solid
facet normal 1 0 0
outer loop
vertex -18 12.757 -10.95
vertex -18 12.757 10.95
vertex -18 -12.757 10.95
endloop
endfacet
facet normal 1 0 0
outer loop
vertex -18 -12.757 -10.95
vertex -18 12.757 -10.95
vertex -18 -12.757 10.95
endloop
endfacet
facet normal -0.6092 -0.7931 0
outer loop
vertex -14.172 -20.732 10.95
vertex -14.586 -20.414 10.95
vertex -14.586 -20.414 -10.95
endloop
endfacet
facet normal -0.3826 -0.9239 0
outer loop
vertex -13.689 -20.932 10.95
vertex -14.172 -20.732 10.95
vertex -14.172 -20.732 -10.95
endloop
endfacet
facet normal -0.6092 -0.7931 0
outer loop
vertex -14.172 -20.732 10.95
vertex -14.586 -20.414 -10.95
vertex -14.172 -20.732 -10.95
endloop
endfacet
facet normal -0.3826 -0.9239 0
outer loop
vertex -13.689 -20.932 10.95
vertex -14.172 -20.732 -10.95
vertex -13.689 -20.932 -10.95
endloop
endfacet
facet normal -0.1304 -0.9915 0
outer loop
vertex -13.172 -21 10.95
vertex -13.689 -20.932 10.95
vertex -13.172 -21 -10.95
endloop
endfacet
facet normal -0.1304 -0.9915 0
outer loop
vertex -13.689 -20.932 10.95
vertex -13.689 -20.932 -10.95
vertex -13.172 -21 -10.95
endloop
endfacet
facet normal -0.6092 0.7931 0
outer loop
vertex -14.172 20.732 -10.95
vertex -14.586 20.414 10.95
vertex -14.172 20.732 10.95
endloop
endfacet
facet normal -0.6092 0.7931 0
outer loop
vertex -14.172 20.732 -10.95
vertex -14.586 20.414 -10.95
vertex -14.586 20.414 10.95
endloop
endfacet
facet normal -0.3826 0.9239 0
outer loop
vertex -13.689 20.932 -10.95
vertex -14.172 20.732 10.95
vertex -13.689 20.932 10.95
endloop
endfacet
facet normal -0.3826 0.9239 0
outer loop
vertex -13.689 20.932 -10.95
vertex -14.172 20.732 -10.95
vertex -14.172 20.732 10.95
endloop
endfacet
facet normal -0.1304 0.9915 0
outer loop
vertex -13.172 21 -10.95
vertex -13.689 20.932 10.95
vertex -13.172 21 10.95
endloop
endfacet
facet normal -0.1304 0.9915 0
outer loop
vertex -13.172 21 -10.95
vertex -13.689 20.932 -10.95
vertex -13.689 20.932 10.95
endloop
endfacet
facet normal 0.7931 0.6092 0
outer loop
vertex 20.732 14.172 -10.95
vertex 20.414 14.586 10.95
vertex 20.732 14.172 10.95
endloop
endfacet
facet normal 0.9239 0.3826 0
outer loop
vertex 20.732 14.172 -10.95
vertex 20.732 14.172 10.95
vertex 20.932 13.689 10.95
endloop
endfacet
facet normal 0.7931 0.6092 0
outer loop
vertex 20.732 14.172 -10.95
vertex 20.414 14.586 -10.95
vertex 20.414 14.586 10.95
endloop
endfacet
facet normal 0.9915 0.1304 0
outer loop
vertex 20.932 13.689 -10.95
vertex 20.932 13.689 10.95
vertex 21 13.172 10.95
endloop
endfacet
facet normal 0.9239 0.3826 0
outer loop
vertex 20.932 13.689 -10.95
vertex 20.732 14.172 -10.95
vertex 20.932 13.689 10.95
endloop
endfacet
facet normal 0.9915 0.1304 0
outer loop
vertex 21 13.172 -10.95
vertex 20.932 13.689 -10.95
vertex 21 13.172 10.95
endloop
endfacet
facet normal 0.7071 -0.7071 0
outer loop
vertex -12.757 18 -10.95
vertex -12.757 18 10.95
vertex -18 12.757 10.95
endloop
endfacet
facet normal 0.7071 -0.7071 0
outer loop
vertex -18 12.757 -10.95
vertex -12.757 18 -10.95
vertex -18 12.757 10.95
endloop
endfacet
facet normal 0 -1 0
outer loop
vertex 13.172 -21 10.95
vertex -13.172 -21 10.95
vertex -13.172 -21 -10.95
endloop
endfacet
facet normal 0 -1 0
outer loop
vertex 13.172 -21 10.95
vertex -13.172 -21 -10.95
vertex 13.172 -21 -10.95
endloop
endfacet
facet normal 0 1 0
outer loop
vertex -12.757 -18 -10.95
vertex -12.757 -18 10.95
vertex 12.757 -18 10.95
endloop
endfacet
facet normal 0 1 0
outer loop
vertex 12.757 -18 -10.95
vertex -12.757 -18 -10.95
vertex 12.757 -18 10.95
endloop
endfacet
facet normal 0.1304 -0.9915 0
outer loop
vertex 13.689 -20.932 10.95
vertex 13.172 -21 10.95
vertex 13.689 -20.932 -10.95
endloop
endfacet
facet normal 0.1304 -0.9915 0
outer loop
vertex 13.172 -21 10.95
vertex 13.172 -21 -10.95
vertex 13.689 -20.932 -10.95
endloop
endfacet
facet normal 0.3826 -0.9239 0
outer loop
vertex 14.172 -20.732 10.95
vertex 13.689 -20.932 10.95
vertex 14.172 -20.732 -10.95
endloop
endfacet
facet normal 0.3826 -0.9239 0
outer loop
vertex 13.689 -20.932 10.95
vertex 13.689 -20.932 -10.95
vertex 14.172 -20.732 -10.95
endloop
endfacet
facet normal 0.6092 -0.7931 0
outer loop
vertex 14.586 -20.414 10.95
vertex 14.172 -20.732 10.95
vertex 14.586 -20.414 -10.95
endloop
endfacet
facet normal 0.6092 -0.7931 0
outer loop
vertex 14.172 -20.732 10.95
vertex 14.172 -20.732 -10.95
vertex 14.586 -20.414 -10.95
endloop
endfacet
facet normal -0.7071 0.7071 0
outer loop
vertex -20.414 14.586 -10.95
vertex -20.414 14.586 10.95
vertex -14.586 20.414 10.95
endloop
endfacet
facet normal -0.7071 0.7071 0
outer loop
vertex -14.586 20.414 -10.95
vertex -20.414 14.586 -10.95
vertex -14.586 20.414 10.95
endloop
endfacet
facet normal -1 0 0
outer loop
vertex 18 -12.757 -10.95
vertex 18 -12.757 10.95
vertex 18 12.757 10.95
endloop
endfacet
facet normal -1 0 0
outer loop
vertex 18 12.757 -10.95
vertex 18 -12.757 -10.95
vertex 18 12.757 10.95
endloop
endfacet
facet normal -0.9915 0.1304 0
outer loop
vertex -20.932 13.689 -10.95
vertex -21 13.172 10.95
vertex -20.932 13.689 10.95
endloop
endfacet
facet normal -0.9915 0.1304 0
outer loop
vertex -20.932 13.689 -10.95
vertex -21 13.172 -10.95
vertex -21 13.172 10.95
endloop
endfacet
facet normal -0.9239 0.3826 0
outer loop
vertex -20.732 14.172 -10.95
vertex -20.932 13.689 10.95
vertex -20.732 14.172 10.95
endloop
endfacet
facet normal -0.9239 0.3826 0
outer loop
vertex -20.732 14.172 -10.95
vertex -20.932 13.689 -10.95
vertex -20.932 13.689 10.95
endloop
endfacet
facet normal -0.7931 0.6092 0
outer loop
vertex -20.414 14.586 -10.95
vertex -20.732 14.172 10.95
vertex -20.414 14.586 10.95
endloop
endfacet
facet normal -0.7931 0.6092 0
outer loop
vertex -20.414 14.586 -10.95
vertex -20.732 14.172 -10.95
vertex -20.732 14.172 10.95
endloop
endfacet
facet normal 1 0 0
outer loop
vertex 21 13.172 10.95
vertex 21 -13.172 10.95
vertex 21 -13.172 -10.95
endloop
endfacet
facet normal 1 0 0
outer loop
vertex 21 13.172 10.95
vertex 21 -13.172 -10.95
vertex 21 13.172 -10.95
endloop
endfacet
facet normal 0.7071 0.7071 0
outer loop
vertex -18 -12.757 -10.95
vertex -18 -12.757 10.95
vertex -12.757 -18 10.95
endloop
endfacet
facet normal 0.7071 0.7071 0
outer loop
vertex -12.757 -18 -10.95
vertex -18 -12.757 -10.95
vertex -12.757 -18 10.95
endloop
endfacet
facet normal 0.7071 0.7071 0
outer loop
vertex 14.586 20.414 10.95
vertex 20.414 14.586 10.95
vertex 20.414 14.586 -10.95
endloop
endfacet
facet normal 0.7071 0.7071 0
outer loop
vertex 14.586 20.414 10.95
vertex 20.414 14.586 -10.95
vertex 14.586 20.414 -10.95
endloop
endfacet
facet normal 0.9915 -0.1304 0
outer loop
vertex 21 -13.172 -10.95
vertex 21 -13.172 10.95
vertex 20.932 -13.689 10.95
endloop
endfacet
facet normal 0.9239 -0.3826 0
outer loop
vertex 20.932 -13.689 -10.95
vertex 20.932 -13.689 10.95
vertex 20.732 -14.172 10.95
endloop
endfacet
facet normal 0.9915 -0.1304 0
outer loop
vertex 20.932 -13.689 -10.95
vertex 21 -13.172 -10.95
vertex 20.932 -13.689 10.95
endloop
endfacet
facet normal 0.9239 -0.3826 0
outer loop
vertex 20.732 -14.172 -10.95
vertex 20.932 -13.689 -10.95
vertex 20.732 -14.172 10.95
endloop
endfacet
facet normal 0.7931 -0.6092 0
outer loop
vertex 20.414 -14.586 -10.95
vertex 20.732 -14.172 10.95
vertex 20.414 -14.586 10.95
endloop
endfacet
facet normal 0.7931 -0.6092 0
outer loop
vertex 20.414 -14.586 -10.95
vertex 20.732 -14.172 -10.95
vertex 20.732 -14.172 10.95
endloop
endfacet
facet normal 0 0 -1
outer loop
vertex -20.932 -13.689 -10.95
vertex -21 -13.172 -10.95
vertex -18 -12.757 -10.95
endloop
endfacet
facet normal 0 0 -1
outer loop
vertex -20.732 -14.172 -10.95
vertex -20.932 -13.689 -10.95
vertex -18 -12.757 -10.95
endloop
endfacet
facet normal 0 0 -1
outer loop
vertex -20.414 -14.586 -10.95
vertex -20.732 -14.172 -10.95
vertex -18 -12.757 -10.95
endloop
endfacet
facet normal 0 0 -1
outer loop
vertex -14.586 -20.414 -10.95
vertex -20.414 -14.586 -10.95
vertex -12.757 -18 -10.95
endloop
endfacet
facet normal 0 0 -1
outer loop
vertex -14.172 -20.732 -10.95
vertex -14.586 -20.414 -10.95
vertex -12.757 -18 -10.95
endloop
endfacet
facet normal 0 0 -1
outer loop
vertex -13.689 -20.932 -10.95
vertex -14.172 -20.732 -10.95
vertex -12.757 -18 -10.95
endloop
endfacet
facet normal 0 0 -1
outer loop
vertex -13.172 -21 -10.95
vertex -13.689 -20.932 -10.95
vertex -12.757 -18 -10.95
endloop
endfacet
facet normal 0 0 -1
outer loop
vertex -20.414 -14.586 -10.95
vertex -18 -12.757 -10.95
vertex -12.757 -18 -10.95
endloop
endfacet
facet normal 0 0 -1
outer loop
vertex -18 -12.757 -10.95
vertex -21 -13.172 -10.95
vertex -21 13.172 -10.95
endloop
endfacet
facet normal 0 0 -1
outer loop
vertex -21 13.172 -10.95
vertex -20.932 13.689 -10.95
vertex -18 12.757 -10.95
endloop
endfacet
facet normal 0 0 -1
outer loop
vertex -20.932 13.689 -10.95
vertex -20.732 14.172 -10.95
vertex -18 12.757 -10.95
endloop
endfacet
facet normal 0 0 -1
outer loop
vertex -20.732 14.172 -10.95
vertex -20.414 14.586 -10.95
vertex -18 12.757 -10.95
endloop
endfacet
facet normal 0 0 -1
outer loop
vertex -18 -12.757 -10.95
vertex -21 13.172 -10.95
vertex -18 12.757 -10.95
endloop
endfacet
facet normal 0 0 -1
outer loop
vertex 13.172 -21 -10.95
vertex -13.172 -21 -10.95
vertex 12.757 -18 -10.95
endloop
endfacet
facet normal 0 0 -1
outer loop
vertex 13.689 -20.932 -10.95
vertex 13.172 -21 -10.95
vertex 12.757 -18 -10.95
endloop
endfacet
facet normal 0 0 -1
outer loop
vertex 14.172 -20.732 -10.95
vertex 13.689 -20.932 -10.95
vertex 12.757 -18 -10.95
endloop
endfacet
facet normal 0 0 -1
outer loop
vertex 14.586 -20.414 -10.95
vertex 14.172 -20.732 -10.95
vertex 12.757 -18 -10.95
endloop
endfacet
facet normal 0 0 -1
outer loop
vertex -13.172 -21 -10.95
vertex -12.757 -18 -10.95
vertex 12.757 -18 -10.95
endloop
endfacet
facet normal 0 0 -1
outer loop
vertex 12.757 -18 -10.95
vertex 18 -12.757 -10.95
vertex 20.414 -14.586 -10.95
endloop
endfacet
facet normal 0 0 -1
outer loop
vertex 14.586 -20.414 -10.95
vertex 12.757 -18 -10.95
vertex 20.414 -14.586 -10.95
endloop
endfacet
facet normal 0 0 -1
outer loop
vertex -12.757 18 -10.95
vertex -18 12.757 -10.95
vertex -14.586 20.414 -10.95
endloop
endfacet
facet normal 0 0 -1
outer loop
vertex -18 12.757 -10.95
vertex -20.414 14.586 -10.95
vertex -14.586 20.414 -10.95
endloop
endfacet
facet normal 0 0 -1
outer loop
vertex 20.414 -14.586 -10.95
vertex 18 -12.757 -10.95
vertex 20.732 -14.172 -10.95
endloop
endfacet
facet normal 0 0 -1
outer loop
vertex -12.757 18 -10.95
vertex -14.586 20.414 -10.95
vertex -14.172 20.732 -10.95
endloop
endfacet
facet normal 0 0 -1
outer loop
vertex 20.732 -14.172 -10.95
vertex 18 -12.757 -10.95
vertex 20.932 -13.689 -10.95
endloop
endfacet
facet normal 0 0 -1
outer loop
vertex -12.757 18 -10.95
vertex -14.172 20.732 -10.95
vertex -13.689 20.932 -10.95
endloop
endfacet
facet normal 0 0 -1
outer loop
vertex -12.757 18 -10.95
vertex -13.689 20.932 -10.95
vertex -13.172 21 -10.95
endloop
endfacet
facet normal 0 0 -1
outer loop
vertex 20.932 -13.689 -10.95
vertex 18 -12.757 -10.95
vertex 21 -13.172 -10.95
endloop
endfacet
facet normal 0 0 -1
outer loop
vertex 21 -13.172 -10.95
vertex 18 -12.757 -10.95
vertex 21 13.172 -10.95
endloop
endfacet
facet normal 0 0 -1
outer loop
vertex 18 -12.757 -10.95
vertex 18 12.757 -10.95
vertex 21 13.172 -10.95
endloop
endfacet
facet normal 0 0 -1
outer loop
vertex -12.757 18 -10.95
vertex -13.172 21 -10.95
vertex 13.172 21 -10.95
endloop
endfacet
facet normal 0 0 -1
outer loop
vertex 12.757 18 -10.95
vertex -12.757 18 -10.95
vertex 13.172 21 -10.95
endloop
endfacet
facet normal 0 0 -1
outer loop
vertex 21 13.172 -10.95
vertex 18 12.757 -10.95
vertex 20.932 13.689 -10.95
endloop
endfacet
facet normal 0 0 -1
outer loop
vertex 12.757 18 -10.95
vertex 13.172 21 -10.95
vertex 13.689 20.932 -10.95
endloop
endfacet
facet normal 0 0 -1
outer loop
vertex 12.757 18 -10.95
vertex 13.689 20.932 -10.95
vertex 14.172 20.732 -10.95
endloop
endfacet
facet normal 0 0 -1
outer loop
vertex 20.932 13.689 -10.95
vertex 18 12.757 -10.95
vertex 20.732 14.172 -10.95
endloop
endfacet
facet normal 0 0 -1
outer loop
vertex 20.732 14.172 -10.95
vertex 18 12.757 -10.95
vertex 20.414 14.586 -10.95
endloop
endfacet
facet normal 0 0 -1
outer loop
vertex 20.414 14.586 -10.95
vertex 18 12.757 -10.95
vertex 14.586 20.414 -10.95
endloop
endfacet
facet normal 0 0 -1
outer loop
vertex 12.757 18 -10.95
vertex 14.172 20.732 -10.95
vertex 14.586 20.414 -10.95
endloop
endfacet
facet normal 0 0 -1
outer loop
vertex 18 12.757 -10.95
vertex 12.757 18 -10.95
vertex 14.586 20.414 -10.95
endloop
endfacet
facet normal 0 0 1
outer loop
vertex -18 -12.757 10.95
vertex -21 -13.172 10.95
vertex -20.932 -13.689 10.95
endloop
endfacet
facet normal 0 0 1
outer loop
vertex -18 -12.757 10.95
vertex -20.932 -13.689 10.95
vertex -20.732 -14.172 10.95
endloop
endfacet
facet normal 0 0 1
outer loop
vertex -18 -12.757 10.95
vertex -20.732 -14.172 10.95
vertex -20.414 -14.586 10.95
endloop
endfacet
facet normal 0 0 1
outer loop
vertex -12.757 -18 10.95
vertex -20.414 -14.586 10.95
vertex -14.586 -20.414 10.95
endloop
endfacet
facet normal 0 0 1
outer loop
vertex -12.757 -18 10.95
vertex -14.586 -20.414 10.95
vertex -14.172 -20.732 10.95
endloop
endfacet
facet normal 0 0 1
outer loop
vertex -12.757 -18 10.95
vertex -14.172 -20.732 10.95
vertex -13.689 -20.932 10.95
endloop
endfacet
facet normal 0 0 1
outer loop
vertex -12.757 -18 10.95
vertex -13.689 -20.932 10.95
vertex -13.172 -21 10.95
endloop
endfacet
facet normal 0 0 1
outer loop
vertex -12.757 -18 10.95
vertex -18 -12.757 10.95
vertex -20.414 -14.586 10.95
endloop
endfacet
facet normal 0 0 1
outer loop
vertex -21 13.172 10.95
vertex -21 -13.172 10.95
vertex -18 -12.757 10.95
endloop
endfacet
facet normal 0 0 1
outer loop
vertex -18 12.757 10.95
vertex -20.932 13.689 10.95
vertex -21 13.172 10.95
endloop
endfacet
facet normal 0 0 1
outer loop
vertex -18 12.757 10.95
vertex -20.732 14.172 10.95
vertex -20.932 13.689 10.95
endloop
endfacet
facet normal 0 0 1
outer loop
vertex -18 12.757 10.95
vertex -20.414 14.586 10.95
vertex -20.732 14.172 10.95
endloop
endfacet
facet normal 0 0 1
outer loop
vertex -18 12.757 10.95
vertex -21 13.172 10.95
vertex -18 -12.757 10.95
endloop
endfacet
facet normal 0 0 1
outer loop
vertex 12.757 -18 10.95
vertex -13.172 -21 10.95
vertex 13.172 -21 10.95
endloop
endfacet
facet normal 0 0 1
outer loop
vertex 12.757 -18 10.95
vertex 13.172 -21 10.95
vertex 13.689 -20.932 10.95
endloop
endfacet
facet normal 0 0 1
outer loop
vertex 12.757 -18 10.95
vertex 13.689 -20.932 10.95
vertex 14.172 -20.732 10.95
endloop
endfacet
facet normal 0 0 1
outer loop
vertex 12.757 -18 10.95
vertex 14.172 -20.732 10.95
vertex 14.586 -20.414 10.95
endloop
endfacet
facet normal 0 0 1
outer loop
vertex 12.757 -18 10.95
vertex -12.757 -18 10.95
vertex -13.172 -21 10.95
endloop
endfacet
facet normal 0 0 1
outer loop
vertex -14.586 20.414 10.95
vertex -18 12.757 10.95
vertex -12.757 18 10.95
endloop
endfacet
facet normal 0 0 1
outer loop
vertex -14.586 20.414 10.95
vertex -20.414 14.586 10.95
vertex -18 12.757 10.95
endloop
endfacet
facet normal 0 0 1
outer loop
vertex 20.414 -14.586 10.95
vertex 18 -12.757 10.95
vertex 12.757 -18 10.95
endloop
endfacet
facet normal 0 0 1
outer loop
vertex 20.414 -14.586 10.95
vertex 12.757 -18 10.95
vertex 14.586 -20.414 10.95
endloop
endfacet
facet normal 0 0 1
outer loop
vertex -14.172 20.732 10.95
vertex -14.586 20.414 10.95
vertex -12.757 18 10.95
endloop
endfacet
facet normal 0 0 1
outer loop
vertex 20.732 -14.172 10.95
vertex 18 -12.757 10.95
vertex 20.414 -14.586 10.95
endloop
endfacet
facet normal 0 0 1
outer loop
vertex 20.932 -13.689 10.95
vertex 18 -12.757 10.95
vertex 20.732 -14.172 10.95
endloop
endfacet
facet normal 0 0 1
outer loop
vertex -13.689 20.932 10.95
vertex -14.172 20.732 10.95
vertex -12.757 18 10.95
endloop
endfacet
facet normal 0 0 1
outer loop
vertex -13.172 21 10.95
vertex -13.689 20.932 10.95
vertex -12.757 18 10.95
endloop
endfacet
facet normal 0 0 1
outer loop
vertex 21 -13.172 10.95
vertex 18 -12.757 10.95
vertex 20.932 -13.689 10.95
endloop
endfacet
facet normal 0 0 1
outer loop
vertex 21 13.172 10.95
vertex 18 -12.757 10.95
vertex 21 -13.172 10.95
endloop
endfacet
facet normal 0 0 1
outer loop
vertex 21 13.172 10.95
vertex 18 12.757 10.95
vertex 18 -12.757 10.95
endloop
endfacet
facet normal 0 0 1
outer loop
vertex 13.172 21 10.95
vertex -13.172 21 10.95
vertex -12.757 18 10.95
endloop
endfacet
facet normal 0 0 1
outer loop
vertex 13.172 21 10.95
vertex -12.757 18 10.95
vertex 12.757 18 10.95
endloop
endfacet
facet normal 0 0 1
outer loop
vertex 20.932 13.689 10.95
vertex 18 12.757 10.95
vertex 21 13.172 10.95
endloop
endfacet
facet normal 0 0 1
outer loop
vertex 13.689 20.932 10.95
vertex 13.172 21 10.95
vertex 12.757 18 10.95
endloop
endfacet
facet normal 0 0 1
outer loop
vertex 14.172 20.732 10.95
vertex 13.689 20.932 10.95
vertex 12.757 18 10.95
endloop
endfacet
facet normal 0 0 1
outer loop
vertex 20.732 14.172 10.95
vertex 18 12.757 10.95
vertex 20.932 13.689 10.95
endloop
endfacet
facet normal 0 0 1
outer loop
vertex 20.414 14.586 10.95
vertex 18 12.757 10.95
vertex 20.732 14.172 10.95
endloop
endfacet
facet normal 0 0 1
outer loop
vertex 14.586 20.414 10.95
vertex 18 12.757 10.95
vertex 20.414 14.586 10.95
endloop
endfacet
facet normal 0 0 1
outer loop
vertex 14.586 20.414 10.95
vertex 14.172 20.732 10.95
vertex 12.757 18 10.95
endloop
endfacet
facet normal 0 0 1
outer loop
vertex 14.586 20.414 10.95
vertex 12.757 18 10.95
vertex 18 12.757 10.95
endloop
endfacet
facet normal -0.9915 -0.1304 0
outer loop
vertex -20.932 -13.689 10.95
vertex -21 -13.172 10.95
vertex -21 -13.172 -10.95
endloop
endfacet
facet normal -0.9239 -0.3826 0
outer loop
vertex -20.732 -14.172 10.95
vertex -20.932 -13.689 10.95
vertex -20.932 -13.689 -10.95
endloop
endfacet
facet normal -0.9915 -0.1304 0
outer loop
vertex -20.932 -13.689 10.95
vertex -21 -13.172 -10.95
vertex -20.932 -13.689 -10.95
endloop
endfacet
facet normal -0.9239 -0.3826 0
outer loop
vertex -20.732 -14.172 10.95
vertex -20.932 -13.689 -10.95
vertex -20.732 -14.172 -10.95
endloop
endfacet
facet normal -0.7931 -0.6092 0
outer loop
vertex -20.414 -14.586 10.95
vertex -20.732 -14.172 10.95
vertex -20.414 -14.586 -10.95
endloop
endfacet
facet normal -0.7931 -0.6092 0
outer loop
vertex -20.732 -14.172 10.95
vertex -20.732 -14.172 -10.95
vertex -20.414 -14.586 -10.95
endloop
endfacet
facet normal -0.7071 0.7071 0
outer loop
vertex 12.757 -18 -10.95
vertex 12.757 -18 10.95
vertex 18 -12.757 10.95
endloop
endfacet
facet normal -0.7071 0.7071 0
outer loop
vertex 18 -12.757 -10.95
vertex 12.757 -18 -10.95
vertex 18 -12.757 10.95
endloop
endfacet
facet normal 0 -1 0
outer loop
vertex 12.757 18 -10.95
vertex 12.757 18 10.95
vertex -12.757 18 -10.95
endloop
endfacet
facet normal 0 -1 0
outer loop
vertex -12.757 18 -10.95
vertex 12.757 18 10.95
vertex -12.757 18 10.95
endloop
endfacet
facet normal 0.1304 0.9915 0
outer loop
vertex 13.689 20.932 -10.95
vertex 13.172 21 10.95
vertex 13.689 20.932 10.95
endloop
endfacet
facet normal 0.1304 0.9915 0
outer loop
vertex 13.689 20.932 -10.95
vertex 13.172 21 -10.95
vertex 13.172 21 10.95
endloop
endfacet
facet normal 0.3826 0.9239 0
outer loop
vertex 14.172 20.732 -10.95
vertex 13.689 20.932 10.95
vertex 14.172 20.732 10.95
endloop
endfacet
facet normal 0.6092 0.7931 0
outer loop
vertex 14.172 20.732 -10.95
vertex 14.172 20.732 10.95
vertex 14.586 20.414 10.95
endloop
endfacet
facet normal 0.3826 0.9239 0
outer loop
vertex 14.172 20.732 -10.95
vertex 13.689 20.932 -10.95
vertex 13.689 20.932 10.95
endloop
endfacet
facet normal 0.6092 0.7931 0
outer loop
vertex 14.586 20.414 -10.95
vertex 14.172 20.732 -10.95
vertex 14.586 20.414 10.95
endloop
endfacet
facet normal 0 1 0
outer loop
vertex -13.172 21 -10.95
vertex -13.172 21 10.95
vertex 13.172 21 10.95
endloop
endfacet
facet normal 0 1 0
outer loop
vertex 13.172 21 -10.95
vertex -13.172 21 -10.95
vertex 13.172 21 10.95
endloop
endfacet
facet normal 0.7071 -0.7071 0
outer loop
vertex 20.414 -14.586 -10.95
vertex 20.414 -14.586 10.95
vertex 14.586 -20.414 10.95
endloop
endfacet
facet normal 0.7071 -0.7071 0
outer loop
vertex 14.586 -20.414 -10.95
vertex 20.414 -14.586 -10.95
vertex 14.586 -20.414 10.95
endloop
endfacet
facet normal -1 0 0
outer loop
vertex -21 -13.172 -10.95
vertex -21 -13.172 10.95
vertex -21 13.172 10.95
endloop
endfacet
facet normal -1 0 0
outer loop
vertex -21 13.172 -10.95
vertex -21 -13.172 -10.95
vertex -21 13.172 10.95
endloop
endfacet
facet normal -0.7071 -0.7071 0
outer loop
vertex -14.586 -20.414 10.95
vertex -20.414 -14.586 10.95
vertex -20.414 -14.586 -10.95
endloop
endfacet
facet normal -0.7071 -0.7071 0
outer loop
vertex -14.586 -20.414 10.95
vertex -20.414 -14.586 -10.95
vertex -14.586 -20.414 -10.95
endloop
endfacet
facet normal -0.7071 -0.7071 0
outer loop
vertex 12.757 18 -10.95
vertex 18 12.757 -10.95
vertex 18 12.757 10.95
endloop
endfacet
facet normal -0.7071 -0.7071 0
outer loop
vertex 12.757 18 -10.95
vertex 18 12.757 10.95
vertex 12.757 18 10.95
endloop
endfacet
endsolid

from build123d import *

# Parameters (mm, degrees)
SKETCH1_W           = 42
SKETCH1_H           = 42
BOSS_EXTRUDE1_DEPTH = 10.95
CUT_EXTRUDE1_REACH  = 38.9
FILLET1_R           = 2
CUT_EXTRUDE2_DEPTH  = 21.9


with BuildPart() as part:
    # Sketch1 → Boss-Extrude1 (new, symmetric)
    with BuildSketch(Plane.XY):
        Rectangle(SKETCH1_W, SKETCH1_H)
    extrude(amount=BOSS_EXTRUDE1_DEPTH, both=True)

    # Sketch2 → Cut-Extrude1 (cut, up to next)
    with BuildSketch(Plane.XY.offset(10.95), mode=Mode.PRIVATE) as cut_extrude1_sk1:
        Polygon((-21, 21), (-21, 14), (-14, 21), align=None)
    cut_extrude1_tool1 = extrude(cut_extrude1_sk1.sketch, amount=-CUT_EXTRUDE1_REACH, mode=Mode.PRIVATE) & part.part
    # Sketch2 → Cut-Extrude1 (cut, up to next)
    with BuildSketch(Plane.XY.offset(10.95), mode=Mode.PRIVATE) as cut_extrude1_sk2:
        Polygon((-21, -14), (-14, -21), (-21, -21), align=None)
    cut_extrude1_tool2 = extrude(cut_extrude1_sk2.sketch, amount=-CUT_EXTRUDE1_REACH, mode=Mode.PRIVATE) & part.part
    # Sketch2 → Cut-Extrude1 (cut, up to next)
    with BuildSketch(Plane.XY.offset(10.95), mode=Mode.PRIVATE) as cut_extrude1_sk3:
        Polygon((21, -21), (21, -14), (14, -21), align=None)
    cut_extrude1_tool3 = extrude(cut_extrude1_sk3.sketch, amount=-CUT_EXTRUDE1_REACH, mode=Mode.PRIVATE) & part.part
    # Sketch2 → Cut-Extrude1 (cut, up to next)
    with BuildSketch(Plane.XY.offset(10.95), mode=Mode.PRIVATE) as cut_extrude1_sk4:
        Polygon((21, 14), (14, 21), (21, 21), align=None)
    cut_extrude1_tool4 = extrude(cut_extrude1_sk4.sketch, amount=-CUT_EXTRUDE1_REACH, mode=Mode.PRIVATE) & part.part
    add(cut_extrude1_tool1.solids().sort_by_distance((-18.666667, 18.666667, 10.95))[0], mode=Mode.SUBTRACT)
    add(cut_extrude1_tool2.solids().sort_by_distance((-18.666667, -18.666667, 10.95))[0], mode=Mode.SUBTRACT)
    add(cut_extrude1_tool3.solids().sort_by_distance((18.666667, -18.666667, 10.95))[0], mode=Mode.SUBTRACT)
    add(cut_extrude1_tool4.solids().sort_by_distance((18.666667, 18.666667, 10.95))[0], mode=Mode.SUBTRACT)

    # Fillet1
    fillet1_edges = [part.edges().sort_by_distance(p)[0] for p in [
        (21, 14, 0),
        (14, 21, 0),
        (14, -21, 0),
        (21, -14, 0),
        (-21, -14, 0),
        (-14, -21, 0),
        (-14, 21, 0),
        (-21, 14, 0),
    ]]
    fillet(fillet1_edges, radius=FILLET1_R)

    # 3DSketch1 → Cut-Extrude2 (cut)
    with BuildSketch(Plane(origin=(12.757359313, -18, 10.95), x_dir=(-0.5782394408510358, 0.8158671148197367, 0), z_dir=(0, 0, 1))):
        Polygon((0, 0), (1.245796512, -7.308799751), (22.062416383, -22.062416383), (29.371216134, -20.816619871), (44.124832765, 0), (42.879036253, 7.308799751), (22.062416383, 22.062416383), (14.753616632, 20.816619871), align=None)
    extrude(amount=-CUT_EXTRUDE2_DEPTH, mode=Mode.SUBTRACT)


solid = part.part
